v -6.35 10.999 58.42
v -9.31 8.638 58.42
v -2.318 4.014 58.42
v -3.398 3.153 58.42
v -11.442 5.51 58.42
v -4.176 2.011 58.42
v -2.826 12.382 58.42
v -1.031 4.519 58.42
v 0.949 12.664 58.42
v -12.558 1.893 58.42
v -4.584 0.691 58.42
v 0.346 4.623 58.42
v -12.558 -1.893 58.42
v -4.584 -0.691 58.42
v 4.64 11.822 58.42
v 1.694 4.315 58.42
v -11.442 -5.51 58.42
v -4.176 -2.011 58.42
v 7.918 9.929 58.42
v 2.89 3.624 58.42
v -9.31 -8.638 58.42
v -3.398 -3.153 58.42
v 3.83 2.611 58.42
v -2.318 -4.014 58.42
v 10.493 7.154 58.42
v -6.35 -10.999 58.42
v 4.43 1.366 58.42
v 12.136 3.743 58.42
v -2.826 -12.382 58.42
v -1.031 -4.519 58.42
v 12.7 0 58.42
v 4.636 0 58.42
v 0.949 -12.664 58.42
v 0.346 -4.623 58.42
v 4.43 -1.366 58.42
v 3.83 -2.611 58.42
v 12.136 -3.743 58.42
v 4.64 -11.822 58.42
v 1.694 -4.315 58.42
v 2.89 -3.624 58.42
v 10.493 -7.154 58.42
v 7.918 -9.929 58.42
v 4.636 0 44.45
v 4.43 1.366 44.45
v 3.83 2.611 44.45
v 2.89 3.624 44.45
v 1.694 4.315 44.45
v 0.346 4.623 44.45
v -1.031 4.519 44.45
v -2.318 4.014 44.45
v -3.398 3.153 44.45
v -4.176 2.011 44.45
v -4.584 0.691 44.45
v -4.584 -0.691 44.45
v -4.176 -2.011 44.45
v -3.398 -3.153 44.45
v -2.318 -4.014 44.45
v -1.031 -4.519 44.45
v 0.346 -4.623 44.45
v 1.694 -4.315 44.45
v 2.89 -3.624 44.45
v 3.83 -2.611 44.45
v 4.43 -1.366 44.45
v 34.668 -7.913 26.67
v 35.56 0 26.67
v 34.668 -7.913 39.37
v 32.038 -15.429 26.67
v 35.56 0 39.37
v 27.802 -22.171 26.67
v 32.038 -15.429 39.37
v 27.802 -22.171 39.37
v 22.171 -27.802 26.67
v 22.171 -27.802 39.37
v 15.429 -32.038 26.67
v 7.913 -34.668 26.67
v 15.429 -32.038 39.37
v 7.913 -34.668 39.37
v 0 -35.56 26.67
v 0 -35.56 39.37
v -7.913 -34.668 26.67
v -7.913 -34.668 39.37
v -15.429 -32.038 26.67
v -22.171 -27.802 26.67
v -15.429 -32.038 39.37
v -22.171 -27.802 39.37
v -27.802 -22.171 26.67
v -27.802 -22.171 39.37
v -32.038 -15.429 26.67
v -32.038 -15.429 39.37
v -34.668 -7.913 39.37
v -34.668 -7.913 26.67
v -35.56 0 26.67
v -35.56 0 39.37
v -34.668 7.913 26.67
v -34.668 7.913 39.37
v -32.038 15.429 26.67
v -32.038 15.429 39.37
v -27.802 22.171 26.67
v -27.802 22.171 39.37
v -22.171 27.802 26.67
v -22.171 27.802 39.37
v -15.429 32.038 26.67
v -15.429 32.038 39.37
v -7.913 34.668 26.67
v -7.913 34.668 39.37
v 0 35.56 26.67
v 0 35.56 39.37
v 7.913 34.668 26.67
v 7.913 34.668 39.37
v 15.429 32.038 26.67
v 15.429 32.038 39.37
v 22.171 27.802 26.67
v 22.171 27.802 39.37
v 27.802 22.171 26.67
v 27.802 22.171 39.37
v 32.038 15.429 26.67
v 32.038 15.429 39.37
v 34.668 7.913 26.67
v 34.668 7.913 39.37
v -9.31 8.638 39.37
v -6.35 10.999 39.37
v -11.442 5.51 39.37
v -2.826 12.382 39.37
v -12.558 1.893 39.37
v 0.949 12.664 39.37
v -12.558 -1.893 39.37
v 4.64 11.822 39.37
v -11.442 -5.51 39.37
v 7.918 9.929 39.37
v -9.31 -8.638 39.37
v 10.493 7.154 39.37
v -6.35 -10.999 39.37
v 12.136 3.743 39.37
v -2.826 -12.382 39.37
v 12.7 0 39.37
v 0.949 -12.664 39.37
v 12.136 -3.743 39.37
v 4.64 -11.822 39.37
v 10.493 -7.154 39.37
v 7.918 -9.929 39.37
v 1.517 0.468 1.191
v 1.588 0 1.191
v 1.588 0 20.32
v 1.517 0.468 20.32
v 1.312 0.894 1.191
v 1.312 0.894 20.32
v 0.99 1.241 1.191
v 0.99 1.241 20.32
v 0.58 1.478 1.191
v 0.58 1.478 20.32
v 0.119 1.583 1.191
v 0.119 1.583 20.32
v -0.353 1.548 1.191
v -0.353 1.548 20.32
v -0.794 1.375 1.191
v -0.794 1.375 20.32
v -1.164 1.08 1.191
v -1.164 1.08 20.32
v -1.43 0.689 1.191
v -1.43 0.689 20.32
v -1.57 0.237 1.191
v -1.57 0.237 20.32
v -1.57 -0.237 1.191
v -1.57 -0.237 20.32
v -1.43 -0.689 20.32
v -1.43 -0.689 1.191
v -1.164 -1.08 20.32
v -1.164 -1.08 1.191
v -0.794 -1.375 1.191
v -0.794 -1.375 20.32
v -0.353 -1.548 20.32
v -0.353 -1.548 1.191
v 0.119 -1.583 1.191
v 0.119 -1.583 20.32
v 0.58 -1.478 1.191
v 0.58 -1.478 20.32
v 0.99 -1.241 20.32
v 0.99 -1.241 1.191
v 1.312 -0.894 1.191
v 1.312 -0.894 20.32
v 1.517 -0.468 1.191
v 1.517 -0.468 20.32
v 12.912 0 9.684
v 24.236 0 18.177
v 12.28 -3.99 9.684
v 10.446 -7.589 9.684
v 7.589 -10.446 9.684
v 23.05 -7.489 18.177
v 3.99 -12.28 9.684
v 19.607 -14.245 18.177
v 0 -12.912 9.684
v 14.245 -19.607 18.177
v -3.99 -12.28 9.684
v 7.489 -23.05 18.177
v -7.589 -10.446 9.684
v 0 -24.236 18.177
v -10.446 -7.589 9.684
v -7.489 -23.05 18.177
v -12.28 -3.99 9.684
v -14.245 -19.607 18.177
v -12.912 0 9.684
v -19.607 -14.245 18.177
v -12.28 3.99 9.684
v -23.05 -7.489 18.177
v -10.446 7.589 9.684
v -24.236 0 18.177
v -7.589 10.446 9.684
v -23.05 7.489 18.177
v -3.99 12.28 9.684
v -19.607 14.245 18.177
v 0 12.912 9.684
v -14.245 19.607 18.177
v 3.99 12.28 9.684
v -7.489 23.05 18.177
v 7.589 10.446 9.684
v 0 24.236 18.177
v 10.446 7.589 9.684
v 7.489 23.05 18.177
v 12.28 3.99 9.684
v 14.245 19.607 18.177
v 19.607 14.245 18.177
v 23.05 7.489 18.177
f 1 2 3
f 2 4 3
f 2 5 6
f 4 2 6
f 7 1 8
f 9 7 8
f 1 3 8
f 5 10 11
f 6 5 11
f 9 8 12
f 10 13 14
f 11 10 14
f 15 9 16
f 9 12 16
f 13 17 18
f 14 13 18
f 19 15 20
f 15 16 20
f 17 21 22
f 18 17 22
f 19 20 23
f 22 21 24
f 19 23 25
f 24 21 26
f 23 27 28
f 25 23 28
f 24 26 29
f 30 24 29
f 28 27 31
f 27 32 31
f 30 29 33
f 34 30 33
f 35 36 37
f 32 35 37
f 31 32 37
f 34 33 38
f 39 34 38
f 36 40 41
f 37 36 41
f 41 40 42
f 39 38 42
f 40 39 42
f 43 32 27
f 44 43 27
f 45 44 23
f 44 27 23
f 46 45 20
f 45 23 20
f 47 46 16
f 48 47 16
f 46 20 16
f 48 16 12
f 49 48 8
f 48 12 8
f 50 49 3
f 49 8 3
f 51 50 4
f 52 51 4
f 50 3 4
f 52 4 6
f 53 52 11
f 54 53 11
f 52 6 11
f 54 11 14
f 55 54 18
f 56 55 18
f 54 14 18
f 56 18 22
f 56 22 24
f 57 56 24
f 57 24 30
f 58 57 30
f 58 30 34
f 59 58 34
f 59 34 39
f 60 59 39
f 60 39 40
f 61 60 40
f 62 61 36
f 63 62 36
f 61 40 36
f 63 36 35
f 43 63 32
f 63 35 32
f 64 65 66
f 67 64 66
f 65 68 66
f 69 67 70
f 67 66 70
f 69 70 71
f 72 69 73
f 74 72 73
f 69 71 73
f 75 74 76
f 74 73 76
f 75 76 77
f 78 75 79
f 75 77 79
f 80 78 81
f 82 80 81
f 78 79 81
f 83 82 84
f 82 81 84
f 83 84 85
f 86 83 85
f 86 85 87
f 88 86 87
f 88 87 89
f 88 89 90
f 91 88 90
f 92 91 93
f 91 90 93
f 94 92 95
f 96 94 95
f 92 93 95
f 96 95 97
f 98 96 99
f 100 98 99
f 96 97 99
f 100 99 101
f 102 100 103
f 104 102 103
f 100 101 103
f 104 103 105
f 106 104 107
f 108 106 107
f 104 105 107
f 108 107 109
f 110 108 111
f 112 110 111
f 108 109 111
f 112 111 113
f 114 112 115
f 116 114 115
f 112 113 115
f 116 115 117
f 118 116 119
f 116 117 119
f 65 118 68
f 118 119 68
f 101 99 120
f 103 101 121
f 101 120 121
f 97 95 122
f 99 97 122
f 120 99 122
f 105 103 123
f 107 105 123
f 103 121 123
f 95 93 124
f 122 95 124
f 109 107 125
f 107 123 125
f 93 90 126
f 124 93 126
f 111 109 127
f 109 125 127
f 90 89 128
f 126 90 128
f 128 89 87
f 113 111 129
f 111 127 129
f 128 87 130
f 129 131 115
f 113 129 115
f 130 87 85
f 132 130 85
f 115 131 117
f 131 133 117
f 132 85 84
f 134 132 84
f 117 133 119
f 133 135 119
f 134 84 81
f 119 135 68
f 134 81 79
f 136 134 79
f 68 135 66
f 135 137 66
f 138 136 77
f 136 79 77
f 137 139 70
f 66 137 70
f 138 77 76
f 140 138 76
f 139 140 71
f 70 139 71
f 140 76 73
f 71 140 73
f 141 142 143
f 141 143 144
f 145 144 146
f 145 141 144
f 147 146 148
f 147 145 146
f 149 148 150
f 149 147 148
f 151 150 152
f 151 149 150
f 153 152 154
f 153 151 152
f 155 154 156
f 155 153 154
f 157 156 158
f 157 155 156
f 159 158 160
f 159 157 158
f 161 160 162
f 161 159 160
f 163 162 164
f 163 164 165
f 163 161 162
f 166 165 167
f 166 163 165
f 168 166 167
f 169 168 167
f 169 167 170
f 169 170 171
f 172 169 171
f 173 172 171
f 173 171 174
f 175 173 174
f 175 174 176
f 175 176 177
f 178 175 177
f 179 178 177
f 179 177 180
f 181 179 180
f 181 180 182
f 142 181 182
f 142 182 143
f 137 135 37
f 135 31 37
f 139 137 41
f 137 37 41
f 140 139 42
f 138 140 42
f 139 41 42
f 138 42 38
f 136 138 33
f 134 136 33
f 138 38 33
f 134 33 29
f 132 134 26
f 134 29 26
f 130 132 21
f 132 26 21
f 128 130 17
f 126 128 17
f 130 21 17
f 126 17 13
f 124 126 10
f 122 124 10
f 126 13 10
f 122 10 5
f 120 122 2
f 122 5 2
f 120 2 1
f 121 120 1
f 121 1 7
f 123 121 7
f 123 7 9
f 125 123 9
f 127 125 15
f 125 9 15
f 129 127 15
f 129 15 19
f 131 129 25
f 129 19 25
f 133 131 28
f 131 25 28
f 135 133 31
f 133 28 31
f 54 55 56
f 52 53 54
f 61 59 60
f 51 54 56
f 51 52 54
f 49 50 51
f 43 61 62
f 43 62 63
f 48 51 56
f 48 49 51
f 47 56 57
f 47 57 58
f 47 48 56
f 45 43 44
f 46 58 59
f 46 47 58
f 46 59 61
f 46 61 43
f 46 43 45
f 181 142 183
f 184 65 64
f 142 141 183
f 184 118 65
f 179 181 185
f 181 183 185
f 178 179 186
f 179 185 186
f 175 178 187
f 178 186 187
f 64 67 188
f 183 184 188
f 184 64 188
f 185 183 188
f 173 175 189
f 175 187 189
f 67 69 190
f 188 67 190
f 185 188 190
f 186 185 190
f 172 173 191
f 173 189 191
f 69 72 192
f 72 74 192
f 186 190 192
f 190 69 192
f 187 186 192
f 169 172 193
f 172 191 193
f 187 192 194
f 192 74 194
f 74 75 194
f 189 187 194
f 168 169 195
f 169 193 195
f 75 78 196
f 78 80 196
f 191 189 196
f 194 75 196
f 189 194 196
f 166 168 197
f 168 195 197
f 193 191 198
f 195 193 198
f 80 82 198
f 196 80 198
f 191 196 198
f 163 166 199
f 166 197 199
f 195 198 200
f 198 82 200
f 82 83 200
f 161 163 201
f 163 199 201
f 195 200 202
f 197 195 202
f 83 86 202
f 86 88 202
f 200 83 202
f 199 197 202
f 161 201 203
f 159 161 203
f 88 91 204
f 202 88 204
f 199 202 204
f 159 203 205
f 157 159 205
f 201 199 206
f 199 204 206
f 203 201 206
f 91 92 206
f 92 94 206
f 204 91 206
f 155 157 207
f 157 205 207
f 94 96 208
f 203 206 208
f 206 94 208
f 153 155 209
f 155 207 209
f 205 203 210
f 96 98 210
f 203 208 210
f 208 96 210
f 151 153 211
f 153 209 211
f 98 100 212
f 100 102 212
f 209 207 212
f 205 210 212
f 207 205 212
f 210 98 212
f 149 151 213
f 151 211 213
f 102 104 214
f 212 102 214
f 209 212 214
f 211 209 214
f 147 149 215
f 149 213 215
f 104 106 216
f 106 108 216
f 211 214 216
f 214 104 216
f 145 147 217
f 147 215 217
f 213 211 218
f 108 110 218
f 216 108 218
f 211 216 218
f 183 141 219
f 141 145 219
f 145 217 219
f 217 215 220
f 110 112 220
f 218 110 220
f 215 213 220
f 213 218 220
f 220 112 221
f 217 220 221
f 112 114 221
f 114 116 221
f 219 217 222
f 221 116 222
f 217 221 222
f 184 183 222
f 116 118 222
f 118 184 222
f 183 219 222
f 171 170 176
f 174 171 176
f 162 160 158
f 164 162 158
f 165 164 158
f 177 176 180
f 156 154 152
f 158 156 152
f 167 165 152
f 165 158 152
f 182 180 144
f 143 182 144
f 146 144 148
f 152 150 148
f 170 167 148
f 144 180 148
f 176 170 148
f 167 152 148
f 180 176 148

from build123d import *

# Parameters (mm, degrees)
F2_R     = 4.6355
F3_DEPTH = 13.97
F4_R     = 1.5875
F5_DEPTH = 20.32


with BuildPart() as f1:
    # F0 (on Front) → F1 (revolve)
    with BuildSketch(Plane.XZ):
        Polygon((0, 58.42), (0, 0), (35.56, 26.67), (35.56, 39.37), (12.7, 39.37), (12.7, 58.42), align=None)
    revolve(axis=Axis((0, 0, 29.21), (0, 0, -1)))

    # F2 (on face) → F3 (cut)
    with BuildSketch(Plane.XY.offset(58.42)):
        Circle(F2_R)
    extrude(amount=-F3_DEPTH, mode=Mode.SUBTRACT)

    # F4 (on Top) → F5 (cut)
    with BuildSketch(Plane.XY):
        Circle(F4_R)
    extrude(amount=F5_DEPTH, mode=Mode.SUBTRACT)


solid = f1.part
